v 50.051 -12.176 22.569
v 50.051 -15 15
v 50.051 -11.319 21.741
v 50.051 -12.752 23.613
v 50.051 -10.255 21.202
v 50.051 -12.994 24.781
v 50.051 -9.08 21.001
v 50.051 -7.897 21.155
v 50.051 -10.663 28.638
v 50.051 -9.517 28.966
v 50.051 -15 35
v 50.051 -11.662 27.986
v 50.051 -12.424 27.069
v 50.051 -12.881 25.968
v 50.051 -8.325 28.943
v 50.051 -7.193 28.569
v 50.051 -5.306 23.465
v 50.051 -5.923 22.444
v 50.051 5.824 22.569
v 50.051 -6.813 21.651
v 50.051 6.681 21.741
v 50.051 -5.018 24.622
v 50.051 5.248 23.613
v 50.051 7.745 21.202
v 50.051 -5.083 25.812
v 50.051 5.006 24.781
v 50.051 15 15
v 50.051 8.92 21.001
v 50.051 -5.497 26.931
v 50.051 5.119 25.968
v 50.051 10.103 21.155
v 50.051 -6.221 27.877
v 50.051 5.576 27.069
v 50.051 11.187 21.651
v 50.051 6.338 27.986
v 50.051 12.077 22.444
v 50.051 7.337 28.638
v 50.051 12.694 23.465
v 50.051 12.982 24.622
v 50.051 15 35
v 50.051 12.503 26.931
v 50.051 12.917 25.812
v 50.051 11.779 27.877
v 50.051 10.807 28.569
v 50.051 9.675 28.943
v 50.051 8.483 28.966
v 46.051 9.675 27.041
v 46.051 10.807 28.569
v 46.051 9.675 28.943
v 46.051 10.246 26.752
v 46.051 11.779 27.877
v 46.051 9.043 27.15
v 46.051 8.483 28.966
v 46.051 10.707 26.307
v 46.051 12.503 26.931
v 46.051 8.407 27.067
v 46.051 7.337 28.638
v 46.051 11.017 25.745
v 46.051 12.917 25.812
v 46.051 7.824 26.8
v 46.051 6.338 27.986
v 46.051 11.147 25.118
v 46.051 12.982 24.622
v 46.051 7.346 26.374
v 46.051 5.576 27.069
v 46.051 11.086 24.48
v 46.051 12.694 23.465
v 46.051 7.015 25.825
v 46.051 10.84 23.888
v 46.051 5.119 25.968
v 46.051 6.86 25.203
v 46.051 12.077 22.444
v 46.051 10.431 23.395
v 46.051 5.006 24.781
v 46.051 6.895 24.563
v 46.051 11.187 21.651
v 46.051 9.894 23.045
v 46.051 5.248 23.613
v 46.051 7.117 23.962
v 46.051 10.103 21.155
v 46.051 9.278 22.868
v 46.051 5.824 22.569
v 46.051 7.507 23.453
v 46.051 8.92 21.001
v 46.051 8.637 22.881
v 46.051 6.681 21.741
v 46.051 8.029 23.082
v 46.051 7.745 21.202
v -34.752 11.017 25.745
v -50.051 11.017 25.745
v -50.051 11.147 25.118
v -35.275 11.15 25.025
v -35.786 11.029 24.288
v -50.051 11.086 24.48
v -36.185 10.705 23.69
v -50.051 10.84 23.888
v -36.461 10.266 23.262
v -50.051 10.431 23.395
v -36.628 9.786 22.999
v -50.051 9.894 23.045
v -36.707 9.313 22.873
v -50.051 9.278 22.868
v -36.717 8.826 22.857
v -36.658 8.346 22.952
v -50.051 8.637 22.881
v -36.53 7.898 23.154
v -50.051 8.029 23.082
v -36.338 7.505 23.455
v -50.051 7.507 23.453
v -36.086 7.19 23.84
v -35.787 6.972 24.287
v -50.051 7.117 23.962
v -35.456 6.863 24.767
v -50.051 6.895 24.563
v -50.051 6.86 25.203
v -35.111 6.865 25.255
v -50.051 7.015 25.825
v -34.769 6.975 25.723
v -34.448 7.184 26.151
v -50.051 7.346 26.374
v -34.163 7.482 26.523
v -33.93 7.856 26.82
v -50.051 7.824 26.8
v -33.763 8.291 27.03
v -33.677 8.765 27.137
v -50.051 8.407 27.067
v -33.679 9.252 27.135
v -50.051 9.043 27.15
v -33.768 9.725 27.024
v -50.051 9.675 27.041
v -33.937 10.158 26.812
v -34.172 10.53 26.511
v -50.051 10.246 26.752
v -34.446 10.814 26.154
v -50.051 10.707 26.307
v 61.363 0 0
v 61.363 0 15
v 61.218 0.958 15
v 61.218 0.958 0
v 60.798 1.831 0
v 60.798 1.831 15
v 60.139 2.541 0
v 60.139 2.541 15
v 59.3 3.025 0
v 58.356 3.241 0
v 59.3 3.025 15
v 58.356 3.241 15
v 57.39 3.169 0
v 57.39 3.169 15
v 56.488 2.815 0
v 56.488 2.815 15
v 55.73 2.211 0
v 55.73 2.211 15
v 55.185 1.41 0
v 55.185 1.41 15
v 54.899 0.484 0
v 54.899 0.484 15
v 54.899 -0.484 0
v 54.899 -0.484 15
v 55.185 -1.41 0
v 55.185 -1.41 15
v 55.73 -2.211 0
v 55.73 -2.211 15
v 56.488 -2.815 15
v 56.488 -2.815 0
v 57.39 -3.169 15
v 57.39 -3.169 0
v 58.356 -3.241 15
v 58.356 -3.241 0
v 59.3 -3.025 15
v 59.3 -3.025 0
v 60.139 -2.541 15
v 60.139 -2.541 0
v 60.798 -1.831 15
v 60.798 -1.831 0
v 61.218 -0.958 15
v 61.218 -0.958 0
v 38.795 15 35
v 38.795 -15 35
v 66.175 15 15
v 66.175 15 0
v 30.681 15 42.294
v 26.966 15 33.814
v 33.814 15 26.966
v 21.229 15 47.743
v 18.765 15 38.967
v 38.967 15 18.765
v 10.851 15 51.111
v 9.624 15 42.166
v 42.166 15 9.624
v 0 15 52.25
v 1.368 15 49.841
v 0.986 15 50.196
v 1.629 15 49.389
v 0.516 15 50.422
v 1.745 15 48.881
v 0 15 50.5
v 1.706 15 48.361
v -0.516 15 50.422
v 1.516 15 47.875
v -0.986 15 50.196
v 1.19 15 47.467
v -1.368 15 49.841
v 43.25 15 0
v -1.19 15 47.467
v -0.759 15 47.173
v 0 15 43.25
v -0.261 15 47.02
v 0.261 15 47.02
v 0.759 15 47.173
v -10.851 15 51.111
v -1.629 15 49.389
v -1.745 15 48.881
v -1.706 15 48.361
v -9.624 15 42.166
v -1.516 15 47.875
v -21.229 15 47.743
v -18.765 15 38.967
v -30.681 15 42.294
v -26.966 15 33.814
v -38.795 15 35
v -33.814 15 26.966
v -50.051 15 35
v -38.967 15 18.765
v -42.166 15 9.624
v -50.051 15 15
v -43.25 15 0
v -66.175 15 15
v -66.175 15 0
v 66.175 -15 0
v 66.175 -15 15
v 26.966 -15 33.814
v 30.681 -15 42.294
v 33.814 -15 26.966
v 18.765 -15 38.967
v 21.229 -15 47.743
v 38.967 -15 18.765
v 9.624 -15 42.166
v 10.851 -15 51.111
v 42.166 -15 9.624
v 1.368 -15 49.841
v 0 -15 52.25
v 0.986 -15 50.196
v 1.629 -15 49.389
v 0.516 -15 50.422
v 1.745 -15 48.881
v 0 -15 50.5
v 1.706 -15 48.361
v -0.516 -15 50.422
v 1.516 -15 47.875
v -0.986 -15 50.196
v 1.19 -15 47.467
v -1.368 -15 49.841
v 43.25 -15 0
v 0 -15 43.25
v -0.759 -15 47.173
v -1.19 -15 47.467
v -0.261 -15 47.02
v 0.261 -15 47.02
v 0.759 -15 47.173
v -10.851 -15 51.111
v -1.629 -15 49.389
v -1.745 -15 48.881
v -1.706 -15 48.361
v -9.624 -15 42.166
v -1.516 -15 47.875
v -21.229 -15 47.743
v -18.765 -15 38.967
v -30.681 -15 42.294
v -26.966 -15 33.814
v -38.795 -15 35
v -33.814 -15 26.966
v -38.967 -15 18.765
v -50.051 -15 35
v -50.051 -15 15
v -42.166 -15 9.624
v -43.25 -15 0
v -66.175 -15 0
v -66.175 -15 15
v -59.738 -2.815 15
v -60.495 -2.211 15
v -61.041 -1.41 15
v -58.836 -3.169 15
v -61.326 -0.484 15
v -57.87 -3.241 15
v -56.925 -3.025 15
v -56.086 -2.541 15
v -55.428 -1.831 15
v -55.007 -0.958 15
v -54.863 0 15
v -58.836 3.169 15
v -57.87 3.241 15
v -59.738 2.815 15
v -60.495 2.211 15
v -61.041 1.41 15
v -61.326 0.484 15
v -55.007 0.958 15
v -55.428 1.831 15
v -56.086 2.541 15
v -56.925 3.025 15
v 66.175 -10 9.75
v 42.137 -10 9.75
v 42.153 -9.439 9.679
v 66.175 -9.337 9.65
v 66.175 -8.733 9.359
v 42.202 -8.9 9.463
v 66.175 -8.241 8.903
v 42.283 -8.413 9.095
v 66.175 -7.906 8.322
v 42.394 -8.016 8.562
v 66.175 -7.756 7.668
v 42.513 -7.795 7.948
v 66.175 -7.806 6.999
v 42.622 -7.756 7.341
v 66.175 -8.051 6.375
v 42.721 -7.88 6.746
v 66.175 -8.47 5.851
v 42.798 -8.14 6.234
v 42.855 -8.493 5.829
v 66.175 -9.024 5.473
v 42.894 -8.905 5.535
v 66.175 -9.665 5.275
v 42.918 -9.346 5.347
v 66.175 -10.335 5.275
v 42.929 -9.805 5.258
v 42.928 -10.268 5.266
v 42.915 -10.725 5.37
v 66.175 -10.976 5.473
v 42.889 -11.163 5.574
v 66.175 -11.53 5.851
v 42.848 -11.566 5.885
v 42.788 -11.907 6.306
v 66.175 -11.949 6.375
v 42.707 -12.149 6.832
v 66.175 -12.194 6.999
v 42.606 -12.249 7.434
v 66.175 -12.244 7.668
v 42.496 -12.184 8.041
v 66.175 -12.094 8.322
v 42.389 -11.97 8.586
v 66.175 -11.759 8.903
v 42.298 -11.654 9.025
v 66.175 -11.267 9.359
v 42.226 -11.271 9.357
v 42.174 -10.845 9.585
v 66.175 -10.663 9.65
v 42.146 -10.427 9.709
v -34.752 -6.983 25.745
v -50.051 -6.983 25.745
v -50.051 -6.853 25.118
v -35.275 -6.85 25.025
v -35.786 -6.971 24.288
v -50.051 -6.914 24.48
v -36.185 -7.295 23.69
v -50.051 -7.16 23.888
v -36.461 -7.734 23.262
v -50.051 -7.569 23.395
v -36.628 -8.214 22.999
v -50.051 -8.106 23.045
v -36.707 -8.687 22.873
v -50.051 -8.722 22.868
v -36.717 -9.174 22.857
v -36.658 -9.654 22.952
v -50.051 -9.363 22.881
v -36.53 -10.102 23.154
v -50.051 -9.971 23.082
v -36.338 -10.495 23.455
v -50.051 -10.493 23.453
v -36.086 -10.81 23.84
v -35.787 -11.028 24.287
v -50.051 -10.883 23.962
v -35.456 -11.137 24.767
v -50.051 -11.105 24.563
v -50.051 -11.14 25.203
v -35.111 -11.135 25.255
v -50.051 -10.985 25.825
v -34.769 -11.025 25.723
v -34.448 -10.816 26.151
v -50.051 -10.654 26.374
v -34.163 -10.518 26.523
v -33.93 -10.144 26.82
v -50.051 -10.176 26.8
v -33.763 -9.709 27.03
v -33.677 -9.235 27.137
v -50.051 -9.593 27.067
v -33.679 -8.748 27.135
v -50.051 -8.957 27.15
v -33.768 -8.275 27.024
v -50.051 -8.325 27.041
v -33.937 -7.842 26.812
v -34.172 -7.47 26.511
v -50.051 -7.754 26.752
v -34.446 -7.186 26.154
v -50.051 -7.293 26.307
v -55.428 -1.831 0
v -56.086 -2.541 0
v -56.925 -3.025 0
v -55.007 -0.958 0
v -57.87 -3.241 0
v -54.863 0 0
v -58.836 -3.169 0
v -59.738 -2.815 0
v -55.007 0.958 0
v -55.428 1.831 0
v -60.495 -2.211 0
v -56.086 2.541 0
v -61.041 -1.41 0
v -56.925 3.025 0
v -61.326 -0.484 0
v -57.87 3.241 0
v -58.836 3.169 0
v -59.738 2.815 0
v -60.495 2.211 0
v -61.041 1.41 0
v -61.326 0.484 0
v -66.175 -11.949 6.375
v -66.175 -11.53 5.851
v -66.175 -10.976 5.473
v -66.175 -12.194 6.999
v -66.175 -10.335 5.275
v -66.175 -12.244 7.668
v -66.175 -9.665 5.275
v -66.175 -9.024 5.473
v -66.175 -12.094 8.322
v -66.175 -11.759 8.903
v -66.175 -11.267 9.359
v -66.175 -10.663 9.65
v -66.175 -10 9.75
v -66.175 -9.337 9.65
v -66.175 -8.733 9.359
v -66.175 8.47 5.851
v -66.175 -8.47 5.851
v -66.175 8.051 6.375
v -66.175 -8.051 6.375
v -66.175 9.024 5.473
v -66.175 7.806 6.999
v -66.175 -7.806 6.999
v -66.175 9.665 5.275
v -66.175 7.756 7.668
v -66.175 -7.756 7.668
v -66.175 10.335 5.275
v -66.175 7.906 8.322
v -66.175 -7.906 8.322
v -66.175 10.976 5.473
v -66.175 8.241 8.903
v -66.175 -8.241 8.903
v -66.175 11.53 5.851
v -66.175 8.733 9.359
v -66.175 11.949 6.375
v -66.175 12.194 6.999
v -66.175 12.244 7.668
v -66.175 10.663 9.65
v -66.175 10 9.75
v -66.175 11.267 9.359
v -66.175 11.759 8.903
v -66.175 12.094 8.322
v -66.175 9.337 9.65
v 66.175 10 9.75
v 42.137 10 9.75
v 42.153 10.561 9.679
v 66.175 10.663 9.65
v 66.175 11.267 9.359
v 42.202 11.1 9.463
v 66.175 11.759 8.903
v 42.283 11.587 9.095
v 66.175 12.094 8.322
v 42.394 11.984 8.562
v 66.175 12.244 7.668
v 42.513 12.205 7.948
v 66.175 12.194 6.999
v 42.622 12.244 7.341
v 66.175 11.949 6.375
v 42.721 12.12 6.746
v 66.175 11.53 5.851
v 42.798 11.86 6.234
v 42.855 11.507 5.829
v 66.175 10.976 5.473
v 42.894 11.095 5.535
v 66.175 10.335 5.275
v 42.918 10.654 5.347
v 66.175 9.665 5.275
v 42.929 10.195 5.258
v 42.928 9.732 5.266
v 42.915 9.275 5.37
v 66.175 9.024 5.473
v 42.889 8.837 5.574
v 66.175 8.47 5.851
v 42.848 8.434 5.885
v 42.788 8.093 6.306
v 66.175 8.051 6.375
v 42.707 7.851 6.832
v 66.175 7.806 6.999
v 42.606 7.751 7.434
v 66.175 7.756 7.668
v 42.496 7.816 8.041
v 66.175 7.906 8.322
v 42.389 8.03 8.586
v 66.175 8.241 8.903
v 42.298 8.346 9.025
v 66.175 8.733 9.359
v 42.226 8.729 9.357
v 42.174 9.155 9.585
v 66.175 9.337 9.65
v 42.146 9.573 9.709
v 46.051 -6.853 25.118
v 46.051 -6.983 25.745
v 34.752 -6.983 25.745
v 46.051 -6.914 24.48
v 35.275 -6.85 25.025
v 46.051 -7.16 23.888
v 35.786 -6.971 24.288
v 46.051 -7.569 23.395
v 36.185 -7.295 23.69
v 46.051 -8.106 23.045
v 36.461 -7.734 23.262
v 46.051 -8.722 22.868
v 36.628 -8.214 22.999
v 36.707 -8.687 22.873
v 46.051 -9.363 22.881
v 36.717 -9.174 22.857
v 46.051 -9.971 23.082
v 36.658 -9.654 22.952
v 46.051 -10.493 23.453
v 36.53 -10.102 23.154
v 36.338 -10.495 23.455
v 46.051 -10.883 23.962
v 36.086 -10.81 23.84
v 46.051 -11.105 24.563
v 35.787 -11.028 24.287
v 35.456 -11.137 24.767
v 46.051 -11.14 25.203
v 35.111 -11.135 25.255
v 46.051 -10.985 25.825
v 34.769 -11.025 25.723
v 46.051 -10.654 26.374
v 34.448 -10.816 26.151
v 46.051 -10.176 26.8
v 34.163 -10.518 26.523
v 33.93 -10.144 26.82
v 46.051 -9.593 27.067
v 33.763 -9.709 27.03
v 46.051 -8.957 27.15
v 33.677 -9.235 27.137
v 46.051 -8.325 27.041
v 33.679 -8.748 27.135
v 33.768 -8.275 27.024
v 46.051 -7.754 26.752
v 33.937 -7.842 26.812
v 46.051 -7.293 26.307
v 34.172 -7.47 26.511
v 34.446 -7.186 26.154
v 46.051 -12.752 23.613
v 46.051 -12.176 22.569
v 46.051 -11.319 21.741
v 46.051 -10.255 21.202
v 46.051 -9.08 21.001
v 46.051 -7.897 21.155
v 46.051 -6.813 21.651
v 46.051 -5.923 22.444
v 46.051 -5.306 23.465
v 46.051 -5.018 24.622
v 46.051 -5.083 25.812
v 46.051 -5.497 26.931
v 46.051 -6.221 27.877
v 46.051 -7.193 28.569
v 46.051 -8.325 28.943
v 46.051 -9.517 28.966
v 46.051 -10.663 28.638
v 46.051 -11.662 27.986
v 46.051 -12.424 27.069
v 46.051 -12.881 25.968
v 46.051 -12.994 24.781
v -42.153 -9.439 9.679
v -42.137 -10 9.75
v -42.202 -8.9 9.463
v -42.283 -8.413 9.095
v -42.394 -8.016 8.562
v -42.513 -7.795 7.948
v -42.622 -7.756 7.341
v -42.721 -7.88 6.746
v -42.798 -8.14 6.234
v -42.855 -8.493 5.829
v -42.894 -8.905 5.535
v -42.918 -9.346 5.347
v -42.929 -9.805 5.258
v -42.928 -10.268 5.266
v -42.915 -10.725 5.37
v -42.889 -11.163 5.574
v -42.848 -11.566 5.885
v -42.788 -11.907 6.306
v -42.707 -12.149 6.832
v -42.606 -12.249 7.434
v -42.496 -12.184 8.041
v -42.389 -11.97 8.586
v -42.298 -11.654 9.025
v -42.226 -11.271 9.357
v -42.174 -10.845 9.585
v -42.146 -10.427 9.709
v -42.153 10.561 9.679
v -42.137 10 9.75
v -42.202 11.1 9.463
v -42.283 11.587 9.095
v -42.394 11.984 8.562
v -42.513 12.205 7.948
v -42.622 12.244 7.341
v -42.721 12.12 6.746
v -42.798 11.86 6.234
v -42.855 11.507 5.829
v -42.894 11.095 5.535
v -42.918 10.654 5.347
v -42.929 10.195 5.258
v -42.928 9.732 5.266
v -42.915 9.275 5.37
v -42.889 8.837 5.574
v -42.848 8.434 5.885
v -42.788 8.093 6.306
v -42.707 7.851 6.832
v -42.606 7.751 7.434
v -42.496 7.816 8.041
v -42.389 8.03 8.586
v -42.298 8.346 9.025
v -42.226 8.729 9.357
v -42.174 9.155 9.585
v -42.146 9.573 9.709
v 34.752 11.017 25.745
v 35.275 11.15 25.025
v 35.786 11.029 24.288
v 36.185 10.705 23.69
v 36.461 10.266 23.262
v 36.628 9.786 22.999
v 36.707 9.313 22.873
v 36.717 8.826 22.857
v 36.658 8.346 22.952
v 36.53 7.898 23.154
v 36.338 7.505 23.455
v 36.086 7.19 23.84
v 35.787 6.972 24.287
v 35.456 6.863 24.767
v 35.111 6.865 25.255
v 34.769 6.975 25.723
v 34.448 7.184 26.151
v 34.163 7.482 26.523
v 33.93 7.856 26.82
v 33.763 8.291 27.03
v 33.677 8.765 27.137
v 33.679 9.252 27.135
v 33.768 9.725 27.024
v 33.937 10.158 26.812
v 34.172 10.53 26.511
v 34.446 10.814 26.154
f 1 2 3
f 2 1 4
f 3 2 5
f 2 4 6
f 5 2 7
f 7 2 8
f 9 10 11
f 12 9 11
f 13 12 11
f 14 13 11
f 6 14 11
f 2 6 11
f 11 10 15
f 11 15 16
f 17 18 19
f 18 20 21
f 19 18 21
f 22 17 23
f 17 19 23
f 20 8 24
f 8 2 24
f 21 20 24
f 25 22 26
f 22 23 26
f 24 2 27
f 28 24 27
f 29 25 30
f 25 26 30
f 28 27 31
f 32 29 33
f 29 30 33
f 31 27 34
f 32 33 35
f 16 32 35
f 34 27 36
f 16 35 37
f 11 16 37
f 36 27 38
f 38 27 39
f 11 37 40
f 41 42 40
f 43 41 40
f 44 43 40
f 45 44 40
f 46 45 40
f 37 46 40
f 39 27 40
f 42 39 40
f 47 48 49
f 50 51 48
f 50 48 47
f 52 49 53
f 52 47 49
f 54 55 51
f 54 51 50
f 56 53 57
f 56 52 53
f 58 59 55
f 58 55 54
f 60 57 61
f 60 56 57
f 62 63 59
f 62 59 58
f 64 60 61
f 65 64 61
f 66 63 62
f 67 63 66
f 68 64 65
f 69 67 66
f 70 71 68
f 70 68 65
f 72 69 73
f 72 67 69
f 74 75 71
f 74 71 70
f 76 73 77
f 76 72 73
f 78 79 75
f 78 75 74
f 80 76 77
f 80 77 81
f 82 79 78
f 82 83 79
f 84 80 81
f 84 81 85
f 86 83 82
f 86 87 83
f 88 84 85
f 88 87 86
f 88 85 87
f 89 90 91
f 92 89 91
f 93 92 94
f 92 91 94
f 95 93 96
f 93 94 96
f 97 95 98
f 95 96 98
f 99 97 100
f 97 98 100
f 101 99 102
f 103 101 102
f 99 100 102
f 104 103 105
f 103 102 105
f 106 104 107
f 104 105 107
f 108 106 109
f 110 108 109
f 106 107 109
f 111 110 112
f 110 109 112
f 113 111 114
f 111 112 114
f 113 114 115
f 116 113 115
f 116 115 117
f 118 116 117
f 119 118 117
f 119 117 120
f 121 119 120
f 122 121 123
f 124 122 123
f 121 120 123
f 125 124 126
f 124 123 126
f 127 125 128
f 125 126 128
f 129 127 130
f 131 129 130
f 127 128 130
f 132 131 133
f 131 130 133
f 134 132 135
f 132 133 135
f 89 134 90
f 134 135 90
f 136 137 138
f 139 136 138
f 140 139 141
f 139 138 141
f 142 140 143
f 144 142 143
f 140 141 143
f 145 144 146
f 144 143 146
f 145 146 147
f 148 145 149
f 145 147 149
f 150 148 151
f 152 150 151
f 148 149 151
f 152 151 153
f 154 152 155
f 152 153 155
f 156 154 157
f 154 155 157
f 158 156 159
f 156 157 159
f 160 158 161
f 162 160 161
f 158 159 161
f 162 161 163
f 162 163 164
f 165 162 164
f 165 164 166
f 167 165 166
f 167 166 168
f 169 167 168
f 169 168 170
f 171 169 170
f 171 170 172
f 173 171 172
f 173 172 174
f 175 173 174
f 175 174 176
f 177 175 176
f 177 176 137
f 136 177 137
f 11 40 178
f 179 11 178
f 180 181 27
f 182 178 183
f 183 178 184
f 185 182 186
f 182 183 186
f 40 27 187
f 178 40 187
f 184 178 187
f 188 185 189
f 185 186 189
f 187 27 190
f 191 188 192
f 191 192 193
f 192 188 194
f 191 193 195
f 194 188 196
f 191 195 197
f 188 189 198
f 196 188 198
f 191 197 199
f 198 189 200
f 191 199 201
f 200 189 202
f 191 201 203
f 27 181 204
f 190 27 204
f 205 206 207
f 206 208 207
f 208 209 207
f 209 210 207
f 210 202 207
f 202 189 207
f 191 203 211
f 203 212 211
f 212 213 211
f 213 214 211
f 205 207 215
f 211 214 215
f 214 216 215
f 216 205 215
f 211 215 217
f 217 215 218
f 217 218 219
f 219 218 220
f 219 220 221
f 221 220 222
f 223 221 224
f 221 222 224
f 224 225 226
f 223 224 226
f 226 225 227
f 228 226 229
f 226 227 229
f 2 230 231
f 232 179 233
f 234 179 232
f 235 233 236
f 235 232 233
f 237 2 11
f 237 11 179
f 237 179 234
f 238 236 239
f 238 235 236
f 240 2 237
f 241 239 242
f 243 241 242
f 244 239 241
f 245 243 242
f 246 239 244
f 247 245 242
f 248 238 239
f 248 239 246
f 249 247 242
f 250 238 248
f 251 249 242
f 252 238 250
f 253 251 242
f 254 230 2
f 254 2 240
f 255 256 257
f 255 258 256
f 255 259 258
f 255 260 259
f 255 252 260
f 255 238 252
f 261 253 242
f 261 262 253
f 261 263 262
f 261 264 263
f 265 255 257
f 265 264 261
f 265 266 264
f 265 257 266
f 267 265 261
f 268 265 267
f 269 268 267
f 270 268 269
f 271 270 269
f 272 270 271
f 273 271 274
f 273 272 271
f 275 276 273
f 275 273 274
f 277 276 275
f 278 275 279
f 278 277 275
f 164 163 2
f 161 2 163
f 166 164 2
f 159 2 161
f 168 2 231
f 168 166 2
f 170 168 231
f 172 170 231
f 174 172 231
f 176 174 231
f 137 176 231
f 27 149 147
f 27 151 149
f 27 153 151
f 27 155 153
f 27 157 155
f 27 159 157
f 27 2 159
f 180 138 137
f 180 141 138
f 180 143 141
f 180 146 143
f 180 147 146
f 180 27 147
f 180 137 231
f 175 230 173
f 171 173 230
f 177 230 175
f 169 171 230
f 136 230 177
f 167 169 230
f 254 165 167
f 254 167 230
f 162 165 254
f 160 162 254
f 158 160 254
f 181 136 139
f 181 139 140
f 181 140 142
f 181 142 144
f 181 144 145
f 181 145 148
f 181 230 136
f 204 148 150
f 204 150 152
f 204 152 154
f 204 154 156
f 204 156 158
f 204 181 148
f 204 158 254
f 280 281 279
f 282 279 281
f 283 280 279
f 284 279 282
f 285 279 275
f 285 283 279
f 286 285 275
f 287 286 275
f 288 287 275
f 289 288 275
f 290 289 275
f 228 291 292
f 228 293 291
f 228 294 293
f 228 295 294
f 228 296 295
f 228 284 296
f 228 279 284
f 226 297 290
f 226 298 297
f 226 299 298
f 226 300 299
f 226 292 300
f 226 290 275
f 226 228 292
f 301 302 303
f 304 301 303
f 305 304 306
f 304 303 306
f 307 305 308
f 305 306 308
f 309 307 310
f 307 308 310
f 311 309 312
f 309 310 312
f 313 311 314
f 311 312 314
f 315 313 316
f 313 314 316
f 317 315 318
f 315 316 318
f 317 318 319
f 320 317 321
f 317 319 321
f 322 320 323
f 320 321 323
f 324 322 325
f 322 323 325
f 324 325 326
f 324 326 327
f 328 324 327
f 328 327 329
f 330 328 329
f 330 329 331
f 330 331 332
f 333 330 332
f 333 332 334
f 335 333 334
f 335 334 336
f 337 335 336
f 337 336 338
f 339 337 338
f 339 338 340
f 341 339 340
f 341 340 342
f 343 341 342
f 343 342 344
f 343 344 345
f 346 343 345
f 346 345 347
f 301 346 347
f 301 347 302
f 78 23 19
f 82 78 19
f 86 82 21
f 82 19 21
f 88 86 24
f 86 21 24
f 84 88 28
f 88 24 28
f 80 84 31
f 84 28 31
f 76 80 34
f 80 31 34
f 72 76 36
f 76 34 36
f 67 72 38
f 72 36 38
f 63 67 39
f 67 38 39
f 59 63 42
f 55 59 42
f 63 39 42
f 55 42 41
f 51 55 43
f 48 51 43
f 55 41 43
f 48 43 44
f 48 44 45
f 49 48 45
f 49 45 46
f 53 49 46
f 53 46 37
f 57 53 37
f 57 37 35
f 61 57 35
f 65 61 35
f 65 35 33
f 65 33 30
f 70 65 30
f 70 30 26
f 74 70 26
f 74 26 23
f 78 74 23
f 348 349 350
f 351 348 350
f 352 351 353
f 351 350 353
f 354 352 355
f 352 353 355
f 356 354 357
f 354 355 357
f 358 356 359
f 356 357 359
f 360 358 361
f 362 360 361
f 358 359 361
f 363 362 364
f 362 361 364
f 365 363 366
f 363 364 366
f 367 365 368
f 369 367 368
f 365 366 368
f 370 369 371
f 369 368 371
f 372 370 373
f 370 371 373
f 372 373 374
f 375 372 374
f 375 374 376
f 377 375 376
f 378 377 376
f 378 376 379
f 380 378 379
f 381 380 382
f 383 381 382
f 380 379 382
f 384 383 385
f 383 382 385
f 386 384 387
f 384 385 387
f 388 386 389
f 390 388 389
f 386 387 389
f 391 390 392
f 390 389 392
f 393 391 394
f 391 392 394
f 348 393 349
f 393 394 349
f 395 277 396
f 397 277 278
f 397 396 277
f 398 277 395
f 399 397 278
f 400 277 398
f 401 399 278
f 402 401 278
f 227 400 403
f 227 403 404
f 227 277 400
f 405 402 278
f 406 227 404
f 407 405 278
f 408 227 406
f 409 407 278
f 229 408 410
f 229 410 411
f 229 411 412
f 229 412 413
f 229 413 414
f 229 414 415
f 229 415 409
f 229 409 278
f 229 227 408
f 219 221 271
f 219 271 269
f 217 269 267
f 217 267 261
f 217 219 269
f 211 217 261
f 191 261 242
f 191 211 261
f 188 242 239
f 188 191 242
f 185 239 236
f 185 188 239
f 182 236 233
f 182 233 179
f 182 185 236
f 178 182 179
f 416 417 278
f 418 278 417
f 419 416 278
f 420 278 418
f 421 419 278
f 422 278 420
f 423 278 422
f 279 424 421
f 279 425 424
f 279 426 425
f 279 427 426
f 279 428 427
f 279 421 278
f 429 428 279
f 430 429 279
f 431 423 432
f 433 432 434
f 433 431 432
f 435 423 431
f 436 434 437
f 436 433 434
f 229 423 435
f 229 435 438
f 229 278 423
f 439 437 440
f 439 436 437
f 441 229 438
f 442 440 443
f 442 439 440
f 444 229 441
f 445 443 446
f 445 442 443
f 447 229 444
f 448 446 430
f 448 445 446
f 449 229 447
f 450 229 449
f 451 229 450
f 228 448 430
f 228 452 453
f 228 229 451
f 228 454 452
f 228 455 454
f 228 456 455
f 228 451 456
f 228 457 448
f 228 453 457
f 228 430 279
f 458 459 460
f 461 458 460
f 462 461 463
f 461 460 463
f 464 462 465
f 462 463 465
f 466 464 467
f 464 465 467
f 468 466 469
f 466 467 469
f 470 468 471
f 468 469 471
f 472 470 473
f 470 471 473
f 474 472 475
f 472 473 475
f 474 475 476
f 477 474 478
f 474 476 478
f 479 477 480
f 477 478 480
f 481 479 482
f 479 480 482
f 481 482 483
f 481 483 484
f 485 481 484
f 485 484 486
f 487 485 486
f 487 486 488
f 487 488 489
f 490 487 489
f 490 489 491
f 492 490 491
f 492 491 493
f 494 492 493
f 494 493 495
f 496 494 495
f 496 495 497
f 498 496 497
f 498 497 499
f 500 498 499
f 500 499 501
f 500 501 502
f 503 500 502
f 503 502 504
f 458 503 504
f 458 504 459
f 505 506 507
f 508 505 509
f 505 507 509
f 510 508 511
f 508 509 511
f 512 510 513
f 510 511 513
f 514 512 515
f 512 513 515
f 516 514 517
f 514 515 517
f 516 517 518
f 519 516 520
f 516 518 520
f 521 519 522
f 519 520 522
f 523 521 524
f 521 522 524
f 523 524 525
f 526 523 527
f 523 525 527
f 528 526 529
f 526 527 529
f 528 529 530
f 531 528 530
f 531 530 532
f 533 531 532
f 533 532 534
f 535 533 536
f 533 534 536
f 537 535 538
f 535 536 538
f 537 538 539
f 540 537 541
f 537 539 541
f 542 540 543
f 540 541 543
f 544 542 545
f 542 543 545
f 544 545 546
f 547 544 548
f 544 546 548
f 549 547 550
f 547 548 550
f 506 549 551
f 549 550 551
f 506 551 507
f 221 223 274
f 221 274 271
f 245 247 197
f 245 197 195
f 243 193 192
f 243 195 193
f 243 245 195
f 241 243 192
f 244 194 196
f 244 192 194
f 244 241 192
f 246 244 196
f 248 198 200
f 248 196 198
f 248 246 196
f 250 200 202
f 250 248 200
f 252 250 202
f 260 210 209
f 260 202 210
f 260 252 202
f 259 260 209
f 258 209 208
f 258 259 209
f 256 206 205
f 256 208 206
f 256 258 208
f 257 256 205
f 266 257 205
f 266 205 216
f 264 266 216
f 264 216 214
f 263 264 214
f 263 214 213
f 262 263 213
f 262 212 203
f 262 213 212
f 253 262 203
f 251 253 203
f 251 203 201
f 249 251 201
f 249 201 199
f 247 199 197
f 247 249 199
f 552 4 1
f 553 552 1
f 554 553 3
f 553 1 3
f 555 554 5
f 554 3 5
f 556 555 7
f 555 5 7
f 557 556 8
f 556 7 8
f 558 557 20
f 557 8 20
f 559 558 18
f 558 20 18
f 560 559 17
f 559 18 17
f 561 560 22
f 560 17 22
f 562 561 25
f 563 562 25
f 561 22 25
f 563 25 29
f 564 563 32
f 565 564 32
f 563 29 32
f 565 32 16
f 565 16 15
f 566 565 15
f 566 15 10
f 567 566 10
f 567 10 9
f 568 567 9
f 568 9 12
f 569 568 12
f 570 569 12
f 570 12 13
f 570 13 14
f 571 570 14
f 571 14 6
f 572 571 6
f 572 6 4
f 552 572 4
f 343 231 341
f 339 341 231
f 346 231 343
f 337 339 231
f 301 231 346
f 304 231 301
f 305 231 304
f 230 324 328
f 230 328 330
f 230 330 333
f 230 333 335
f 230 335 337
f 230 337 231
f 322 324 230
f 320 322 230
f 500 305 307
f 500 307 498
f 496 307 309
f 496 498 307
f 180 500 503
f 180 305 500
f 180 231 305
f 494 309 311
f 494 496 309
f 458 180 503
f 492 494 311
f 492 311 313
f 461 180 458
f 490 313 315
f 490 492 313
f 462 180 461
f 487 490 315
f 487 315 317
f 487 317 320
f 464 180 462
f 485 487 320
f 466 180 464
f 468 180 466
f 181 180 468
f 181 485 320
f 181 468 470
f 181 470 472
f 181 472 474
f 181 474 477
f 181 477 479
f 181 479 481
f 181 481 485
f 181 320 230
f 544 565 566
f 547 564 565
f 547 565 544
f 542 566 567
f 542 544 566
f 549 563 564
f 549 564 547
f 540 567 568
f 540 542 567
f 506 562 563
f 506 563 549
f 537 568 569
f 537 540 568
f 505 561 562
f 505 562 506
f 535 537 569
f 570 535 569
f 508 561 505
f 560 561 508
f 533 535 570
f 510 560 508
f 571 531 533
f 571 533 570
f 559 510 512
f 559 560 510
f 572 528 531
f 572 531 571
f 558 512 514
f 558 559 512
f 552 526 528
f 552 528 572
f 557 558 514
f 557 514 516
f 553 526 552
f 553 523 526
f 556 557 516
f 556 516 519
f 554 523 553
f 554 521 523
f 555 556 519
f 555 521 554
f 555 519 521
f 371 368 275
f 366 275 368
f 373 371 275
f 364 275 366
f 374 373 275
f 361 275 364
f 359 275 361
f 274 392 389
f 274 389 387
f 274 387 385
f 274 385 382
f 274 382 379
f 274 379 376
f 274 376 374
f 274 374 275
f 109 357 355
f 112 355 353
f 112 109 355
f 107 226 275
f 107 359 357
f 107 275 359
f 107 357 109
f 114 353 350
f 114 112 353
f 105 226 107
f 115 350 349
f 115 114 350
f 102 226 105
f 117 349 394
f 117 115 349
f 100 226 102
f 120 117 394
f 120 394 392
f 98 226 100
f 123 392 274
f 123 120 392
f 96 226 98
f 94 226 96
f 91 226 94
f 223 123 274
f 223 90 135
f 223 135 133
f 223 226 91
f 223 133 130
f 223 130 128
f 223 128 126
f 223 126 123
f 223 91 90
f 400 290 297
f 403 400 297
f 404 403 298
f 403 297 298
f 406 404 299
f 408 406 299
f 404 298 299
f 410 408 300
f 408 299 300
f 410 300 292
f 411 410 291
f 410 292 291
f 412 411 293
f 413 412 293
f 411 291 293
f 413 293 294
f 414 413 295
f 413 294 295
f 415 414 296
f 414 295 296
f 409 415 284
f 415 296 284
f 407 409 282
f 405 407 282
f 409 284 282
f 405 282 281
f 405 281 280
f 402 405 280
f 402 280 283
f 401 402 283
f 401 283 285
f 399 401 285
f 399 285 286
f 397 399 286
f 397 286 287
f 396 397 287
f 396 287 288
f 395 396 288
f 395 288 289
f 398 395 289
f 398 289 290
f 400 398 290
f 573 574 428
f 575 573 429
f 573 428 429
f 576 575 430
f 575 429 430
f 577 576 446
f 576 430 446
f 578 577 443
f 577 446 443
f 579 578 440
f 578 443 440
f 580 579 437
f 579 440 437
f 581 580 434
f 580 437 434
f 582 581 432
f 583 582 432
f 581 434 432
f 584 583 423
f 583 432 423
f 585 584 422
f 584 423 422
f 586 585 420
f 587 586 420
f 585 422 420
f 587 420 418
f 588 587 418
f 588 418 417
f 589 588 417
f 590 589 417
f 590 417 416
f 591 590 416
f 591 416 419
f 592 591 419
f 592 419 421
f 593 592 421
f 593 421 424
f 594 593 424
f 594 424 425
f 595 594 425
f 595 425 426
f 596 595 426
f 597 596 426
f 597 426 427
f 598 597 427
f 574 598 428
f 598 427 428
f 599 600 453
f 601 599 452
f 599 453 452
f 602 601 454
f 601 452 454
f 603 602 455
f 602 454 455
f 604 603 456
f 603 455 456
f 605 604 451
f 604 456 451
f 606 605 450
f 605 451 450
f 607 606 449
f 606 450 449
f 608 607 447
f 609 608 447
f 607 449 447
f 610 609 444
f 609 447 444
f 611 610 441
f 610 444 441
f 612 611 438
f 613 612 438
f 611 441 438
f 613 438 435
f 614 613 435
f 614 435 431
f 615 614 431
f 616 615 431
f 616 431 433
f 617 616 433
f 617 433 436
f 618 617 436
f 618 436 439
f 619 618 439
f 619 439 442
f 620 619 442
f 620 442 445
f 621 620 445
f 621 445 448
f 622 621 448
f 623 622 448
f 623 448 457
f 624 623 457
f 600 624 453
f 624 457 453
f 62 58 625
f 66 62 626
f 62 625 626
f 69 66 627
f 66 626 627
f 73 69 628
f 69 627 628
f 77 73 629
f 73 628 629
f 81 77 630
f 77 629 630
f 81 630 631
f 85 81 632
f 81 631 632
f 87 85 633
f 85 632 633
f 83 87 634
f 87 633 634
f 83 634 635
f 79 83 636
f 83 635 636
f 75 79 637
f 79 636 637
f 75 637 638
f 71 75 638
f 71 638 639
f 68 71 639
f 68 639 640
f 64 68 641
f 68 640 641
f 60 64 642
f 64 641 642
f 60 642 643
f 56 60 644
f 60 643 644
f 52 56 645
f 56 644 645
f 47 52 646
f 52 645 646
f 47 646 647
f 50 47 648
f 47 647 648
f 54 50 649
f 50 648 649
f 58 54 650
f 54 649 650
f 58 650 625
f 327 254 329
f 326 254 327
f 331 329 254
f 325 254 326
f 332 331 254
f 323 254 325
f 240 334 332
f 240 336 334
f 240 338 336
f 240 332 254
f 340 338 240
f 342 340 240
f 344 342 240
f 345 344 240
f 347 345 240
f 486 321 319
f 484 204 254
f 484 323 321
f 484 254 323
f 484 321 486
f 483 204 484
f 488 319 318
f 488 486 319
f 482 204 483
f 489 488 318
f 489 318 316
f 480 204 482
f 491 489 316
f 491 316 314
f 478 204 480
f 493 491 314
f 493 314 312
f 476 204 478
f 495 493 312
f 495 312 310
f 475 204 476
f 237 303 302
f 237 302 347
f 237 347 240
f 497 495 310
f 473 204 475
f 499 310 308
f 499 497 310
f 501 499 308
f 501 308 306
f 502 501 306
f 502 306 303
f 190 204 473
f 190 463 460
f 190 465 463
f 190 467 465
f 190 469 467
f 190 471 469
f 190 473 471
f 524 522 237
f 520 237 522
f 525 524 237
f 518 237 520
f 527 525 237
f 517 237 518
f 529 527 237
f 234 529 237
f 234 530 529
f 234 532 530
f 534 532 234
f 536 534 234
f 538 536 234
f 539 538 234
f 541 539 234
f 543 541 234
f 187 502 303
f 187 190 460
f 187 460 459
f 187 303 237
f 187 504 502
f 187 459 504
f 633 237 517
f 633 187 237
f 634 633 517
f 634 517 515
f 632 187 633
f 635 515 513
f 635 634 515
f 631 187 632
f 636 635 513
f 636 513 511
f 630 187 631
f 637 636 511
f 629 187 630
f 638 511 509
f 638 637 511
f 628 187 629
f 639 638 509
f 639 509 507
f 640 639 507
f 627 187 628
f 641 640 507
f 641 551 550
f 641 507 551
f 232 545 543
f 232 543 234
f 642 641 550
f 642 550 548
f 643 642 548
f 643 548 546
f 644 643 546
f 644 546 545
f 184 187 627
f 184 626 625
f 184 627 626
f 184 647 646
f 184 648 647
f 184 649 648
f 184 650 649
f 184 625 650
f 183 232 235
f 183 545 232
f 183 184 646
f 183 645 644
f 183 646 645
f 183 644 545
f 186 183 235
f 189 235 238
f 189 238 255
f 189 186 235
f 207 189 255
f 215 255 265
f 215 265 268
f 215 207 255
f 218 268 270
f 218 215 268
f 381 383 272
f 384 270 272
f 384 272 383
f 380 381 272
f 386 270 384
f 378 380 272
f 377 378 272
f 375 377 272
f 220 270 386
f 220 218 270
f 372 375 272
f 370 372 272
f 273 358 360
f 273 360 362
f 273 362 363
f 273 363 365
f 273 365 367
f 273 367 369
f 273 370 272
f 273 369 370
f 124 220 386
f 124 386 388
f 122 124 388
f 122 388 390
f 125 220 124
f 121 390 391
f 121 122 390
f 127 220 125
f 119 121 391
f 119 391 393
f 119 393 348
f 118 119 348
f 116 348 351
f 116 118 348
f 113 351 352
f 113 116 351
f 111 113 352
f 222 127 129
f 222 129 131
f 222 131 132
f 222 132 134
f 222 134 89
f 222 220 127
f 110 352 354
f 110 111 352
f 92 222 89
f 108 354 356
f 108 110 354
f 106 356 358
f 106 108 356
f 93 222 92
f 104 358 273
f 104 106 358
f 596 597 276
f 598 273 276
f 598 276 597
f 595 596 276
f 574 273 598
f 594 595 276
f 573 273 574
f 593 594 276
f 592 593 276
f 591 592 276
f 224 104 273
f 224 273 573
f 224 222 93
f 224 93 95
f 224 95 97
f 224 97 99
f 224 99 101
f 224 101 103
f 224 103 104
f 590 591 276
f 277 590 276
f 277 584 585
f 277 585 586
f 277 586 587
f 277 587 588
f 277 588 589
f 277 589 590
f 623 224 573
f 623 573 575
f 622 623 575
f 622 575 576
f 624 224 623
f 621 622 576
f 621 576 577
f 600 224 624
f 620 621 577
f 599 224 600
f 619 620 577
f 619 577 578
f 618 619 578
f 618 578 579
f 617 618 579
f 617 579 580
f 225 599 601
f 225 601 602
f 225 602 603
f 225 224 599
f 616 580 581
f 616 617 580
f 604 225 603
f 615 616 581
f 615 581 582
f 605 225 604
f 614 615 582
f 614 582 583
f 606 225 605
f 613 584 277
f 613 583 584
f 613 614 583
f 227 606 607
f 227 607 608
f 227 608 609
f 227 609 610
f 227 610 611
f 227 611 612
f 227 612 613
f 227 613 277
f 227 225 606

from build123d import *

# Parameters (mm, degrees)
BOSS_EXTRUDE1_DEPTH            = 15
SKETCH2_R                      = 3.25
CUT_EXTRUDE1_DEPTH             = 78.406027705
SKETCH3_R                      = 2.25
CUT_EXTRUDE2_DEPTH             = 144.078946739
CUT_EXTRUDE3_DEPTH             = 90.494095583
CUT_EXTRUDE3_DEPTH_BACK        = 90.494095583
SKETCH4_R                      = 1.75
BOSS_EXTRUDE2_DEPTH            = 30
CBORE_FOR_M4_SHCS1_D           = 4.3
CBORE_FOR_M4_SHCS1_DEPTH       = 100.101198794
CBORE_FOR_M4_SHCS1_CBORE_D     = 8
CBORE_FOR_M4_SHCS1_CBORE_DEPTH = 4
CBORE_FOR_M4_SHCS1_TIP         = 1.291850331


with BuildPart() as part:
    # Sketch1 → Boss-Extrude1 (new, symmetric)
    with BuildSketch(Plane(origin=(0, 0, 0), x_dir=(1, 0, 0), z_dir=(0, 1, 0))):
        with BuildLine():
            Line((-43.25, 0), (-66.175, 0))
            Line((-66.175, 0), (-66.175, -15))
            Line((-66.175, -15), (-50.050599397, -15))
            ThreePointArc((-50.050599397, -15), (0, -52.25), (50.050599397, -15))
            Line((50.050599397, -15), (66.175, -15))
            Line((66.175, -15), (66.175, 0))
            Line((66.175, 0), (43.25, 0))
            ThreePointArc((43.25, 0), (0, -43.25), (-43.25, 0))
        make_face()
    extrude(amount=BOSS_EXTRUDE1_DEPTH, both=True)

    # Sketch2 → Cut-Extrude1 (cut, through all)
    with BuildSketch(Plane.XY.offset(15)):
        with Locations((-58.112799699, 0)):
            Circle(SKETCH2_R)
        with Locations((58.112799699, 0)):
            Circle(SKETCH2_R)
    extrude(amount=-CUT_EXTRUDE1_DEPTH, mode=Mode.SUBTRACT)

    # Sketch3 → Cut-Extrude2 (cut, through all)
    with BuildSketch(Plane.ZY.offset(66.175)):
        with Locations((7.5, -10)):
            Circle(SKETCH3_R)
        with Locations((7.5, 10)):
            Circle(SKETCH3_R)
    extrude(amount=-CUT_EXTRUDE2_DEPTH, mode=Mode.SUBTRACT)

    # Sketch4 → Cut-Extrude3 (cut, two sides: drawn at the far end of the back side and taken through both)
    with BuildSketch(Plane(origin=(0, 15, 0), x_dir=(1, 0, 0), z_dir=(0, 1, 0)).offset(-CUT_EXTRUDE3_DEPTH_BACK)):
        with Locations(Location((0, -48.75, 0), (0, 0, 270))):
            Circle(SKETCH4_R)
    extrude(amount=CUT_EXTRUDE3_DEPTH + CUT_EXTRUDE3_DEPTH_BACK, mode=Mode.SUBTRACT)

    # Sketch5 → Boss-Extrude2 (add)
    with BuildSketch(Plane(origin=(0, 15, 0), x_dir=(1, 0, 0), z_dir=(0, 1, 0))):
        with BuildLine():
            Line((-50.050599397, -15), (-50.050599397, -35))
            Line((-50.050599397, -35), (-38.795135004, -35))
            ThreePointArc((-38.795135004, -35), (-45.534504832, -25.625599889), (-50.050599397, -15))
        make_face()
    boss_extrude2 = extrude(amount=-BOSS_EXTRUDE2_DEPTH)

    # Mirror1: Boss-Extrude2 across plane
    add(boss_extrude2.mirror(Plane.ZY))

    # CBORE for M4 SHCS1
    with Locations(Plane(origin=(50.050599397, 54.222001278, 632.558854999), x_dir=(0, -0.9379679207103062, -0.3467220496570483), z_dir=(1, 0, 0))):
        with Locations((253.070838002, 554.191250959), (269.954260575, 547.950254066)):
            CounterBoreHole(CBORE_FOR_M4_SHCS1_D / 2, CBORE_FOR_M4_SHCS1_CBORE_D / 2, CBORE_FOR_M4_SHCS1_CBORE_DEPTH, depth=CBORE_FOR_M4_SHCS1_DEPTH)
            with Locations((0, 0, -(CBORE_FOR_M4_SHCS1_DEPTH + CBORE_FOR_M4_SHCS1_TIP / 2))):  # 118° drill point
                Cone(0, CBORE_FOR_M4_SHCS1_D / 2, CBORE_FOR_M4_SHCS1_TIP, mode=Mode.SUBTRACT)


solid = part.part
